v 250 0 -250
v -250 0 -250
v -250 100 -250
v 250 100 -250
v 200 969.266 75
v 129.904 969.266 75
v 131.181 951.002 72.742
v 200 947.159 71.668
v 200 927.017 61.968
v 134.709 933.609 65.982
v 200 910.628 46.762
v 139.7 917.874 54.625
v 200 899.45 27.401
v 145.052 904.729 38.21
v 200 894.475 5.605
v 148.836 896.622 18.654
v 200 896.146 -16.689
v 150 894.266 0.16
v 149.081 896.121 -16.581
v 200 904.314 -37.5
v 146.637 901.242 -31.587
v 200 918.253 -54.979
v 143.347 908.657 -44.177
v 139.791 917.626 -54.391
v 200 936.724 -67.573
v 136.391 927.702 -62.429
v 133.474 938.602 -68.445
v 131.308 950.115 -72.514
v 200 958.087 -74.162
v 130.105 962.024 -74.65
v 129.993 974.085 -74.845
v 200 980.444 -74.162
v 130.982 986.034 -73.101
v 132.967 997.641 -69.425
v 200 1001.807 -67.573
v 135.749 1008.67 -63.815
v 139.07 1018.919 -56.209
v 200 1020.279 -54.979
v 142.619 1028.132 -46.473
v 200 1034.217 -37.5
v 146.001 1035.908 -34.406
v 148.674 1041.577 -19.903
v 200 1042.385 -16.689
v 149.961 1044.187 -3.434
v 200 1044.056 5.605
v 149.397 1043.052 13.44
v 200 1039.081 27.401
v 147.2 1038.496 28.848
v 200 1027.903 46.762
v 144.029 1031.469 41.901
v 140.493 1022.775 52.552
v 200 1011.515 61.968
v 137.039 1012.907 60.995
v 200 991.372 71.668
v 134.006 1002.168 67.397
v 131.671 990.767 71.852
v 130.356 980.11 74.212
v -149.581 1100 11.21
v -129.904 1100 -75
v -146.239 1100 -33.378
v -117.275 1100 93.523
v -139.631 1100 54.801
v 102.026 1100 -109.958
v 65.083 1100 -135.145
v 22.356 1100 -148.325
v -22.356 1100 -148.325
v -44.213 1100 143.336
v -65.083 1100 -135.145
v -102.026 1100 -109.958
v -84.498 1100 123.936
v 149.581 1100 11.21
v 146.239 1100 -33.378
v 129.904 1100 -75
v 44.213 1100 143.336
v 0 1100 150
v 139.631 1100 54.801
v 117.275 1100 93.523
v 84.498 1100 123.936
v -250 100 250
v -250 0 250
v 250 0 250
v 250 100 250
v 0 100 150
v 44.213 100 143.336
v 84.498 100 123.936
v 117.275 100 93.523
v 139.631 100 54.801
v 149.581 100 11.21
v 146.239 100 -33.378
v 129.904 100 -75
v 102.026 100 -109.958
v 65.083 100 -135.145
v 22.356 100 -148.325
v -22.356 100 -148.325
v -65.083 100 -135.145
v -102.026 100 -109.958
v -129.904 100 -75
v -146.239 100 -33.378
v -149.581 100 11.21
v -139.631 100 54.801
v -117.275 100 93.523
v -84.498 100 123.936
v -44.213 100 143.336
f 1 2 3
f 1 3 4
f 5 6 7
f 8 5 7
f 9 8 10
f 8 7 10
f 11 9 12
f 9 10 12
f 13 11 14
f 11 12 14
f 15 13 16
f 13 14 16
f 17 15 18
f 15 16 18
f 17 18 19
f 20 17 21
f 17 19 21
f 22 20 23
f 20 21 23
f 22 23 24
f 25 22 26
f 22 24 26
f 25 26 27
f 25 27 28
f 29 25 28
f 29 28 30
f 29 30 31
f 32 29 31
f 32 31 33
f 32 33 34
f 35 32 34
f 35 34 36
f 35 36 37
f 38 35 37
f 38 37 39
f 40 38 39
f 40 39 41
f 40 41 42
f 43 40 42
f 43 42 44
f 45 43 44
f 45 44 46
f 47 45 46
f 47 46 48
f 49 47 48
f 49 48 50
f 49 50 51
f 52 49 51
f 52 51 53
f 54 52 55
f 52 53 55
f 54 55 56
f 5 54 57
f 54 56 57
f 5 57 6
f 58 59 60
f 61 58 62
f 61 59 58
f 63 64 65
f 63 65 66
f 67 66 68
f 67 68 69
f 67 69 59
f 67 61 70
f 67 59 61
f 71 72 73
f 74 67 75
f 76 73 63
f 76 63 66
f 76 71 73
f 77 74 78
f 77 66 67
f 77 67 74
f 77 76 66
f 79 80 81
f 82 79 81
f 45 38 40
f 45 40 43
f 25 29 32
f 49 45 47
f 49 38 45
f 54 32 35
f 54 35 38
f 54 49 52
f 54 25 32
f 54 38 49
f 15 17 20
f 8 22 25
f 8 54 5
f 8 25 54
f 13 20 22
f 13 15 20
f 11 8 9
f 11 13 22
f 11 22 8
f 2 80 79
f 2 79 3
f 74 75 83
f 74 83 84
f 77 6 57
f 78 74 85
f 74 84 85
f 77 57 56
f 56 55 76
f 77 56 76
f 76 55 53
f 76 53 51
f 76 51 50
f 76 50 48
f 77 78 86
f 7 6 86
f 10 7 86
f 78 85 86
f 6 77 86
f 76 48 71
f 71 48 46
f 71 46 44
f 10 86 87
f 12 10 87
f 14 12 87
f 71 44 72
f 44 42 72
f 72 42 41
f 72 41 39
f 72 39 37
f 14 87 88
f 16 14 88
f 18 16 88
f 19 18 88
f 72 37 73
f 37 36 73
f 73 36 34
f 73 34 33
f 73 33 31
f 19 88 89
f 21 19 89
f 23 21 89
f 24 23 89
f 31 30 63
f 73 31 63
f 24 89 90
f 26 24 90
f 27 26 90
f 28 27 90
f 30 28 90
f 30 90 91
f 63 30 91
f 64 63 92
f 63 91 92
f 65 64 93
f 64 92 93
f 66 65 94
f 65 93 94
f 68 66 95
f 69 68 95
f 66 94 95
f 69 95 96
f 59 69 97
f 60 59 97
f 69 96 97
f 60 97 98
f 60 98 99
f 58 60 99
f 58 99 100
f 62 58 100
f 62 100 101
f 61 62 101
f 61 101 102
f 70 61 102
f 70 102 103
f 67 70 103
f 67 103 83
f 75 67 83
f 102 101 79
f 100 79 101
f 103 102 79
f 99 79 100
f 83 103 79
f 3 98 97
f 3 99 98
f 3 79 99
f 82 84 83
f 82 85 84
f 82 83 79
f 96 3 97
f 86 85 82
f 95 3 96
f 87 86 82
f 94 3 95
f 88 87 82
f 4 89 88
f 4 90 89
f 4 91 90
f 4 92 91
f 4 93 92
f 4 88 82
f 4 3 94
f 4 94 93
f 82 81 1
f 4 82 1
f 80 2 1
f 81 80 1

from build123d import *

# Parameters (mm, degrees)
CROQUIS2_W              = 500
CROQUIS2_H              = 500
SALIENTE_EXTRUIR1_DEPTH = 100
CROQUIS3_R              = 150
SALIENTE_EXTRUIR2_DEPTH = 1000
CROQUIS5_R              = 75
SALIENTE_EXTRUIR4_DEPTH = 200


with BuildPart() as part:
    # Croquis2 → Saliente-Extruir1 (new body)
    with BuildSketch(Plane(origin=(0, 0, 0), x_dir=(1, 0, 0), z_dir=(0, 1, 0))):
        Rectangle(CROQUIS2_W, CROQUIS2_H)
    extrude(amount=SALIENTE_EXTRUIR1_DEPTH)

    # Croquis3 → Saliente-Extruir2 (add)
    with BuildSketch(Plane(origin=(0, 100, 0), x_dir=(1, 0, 0), z_dir=(0, 1, 0))):
        with Locations(Location((0, 0, 0), (0, 0, 270))):
            Circle(CROQUIS3_R)
    extrude(amount=SALIENTE_EXTRUIR2_DEPTH)

    # Croquis5 → Saliente-Extruir4 (add)
    with BuildSketch(Plane(origin=(0, 0, 0), x_dir=(0, 0, -1), z_dir=(1, 0, 0))):
        with Locations(Location((0, 969.265591665, 0), (0, 0, 180))):
            Circle(CROQUIS5_R)
    extrude(amount=SALIENTE_EXTRUIR4_DEPTH)


solid = part.part
